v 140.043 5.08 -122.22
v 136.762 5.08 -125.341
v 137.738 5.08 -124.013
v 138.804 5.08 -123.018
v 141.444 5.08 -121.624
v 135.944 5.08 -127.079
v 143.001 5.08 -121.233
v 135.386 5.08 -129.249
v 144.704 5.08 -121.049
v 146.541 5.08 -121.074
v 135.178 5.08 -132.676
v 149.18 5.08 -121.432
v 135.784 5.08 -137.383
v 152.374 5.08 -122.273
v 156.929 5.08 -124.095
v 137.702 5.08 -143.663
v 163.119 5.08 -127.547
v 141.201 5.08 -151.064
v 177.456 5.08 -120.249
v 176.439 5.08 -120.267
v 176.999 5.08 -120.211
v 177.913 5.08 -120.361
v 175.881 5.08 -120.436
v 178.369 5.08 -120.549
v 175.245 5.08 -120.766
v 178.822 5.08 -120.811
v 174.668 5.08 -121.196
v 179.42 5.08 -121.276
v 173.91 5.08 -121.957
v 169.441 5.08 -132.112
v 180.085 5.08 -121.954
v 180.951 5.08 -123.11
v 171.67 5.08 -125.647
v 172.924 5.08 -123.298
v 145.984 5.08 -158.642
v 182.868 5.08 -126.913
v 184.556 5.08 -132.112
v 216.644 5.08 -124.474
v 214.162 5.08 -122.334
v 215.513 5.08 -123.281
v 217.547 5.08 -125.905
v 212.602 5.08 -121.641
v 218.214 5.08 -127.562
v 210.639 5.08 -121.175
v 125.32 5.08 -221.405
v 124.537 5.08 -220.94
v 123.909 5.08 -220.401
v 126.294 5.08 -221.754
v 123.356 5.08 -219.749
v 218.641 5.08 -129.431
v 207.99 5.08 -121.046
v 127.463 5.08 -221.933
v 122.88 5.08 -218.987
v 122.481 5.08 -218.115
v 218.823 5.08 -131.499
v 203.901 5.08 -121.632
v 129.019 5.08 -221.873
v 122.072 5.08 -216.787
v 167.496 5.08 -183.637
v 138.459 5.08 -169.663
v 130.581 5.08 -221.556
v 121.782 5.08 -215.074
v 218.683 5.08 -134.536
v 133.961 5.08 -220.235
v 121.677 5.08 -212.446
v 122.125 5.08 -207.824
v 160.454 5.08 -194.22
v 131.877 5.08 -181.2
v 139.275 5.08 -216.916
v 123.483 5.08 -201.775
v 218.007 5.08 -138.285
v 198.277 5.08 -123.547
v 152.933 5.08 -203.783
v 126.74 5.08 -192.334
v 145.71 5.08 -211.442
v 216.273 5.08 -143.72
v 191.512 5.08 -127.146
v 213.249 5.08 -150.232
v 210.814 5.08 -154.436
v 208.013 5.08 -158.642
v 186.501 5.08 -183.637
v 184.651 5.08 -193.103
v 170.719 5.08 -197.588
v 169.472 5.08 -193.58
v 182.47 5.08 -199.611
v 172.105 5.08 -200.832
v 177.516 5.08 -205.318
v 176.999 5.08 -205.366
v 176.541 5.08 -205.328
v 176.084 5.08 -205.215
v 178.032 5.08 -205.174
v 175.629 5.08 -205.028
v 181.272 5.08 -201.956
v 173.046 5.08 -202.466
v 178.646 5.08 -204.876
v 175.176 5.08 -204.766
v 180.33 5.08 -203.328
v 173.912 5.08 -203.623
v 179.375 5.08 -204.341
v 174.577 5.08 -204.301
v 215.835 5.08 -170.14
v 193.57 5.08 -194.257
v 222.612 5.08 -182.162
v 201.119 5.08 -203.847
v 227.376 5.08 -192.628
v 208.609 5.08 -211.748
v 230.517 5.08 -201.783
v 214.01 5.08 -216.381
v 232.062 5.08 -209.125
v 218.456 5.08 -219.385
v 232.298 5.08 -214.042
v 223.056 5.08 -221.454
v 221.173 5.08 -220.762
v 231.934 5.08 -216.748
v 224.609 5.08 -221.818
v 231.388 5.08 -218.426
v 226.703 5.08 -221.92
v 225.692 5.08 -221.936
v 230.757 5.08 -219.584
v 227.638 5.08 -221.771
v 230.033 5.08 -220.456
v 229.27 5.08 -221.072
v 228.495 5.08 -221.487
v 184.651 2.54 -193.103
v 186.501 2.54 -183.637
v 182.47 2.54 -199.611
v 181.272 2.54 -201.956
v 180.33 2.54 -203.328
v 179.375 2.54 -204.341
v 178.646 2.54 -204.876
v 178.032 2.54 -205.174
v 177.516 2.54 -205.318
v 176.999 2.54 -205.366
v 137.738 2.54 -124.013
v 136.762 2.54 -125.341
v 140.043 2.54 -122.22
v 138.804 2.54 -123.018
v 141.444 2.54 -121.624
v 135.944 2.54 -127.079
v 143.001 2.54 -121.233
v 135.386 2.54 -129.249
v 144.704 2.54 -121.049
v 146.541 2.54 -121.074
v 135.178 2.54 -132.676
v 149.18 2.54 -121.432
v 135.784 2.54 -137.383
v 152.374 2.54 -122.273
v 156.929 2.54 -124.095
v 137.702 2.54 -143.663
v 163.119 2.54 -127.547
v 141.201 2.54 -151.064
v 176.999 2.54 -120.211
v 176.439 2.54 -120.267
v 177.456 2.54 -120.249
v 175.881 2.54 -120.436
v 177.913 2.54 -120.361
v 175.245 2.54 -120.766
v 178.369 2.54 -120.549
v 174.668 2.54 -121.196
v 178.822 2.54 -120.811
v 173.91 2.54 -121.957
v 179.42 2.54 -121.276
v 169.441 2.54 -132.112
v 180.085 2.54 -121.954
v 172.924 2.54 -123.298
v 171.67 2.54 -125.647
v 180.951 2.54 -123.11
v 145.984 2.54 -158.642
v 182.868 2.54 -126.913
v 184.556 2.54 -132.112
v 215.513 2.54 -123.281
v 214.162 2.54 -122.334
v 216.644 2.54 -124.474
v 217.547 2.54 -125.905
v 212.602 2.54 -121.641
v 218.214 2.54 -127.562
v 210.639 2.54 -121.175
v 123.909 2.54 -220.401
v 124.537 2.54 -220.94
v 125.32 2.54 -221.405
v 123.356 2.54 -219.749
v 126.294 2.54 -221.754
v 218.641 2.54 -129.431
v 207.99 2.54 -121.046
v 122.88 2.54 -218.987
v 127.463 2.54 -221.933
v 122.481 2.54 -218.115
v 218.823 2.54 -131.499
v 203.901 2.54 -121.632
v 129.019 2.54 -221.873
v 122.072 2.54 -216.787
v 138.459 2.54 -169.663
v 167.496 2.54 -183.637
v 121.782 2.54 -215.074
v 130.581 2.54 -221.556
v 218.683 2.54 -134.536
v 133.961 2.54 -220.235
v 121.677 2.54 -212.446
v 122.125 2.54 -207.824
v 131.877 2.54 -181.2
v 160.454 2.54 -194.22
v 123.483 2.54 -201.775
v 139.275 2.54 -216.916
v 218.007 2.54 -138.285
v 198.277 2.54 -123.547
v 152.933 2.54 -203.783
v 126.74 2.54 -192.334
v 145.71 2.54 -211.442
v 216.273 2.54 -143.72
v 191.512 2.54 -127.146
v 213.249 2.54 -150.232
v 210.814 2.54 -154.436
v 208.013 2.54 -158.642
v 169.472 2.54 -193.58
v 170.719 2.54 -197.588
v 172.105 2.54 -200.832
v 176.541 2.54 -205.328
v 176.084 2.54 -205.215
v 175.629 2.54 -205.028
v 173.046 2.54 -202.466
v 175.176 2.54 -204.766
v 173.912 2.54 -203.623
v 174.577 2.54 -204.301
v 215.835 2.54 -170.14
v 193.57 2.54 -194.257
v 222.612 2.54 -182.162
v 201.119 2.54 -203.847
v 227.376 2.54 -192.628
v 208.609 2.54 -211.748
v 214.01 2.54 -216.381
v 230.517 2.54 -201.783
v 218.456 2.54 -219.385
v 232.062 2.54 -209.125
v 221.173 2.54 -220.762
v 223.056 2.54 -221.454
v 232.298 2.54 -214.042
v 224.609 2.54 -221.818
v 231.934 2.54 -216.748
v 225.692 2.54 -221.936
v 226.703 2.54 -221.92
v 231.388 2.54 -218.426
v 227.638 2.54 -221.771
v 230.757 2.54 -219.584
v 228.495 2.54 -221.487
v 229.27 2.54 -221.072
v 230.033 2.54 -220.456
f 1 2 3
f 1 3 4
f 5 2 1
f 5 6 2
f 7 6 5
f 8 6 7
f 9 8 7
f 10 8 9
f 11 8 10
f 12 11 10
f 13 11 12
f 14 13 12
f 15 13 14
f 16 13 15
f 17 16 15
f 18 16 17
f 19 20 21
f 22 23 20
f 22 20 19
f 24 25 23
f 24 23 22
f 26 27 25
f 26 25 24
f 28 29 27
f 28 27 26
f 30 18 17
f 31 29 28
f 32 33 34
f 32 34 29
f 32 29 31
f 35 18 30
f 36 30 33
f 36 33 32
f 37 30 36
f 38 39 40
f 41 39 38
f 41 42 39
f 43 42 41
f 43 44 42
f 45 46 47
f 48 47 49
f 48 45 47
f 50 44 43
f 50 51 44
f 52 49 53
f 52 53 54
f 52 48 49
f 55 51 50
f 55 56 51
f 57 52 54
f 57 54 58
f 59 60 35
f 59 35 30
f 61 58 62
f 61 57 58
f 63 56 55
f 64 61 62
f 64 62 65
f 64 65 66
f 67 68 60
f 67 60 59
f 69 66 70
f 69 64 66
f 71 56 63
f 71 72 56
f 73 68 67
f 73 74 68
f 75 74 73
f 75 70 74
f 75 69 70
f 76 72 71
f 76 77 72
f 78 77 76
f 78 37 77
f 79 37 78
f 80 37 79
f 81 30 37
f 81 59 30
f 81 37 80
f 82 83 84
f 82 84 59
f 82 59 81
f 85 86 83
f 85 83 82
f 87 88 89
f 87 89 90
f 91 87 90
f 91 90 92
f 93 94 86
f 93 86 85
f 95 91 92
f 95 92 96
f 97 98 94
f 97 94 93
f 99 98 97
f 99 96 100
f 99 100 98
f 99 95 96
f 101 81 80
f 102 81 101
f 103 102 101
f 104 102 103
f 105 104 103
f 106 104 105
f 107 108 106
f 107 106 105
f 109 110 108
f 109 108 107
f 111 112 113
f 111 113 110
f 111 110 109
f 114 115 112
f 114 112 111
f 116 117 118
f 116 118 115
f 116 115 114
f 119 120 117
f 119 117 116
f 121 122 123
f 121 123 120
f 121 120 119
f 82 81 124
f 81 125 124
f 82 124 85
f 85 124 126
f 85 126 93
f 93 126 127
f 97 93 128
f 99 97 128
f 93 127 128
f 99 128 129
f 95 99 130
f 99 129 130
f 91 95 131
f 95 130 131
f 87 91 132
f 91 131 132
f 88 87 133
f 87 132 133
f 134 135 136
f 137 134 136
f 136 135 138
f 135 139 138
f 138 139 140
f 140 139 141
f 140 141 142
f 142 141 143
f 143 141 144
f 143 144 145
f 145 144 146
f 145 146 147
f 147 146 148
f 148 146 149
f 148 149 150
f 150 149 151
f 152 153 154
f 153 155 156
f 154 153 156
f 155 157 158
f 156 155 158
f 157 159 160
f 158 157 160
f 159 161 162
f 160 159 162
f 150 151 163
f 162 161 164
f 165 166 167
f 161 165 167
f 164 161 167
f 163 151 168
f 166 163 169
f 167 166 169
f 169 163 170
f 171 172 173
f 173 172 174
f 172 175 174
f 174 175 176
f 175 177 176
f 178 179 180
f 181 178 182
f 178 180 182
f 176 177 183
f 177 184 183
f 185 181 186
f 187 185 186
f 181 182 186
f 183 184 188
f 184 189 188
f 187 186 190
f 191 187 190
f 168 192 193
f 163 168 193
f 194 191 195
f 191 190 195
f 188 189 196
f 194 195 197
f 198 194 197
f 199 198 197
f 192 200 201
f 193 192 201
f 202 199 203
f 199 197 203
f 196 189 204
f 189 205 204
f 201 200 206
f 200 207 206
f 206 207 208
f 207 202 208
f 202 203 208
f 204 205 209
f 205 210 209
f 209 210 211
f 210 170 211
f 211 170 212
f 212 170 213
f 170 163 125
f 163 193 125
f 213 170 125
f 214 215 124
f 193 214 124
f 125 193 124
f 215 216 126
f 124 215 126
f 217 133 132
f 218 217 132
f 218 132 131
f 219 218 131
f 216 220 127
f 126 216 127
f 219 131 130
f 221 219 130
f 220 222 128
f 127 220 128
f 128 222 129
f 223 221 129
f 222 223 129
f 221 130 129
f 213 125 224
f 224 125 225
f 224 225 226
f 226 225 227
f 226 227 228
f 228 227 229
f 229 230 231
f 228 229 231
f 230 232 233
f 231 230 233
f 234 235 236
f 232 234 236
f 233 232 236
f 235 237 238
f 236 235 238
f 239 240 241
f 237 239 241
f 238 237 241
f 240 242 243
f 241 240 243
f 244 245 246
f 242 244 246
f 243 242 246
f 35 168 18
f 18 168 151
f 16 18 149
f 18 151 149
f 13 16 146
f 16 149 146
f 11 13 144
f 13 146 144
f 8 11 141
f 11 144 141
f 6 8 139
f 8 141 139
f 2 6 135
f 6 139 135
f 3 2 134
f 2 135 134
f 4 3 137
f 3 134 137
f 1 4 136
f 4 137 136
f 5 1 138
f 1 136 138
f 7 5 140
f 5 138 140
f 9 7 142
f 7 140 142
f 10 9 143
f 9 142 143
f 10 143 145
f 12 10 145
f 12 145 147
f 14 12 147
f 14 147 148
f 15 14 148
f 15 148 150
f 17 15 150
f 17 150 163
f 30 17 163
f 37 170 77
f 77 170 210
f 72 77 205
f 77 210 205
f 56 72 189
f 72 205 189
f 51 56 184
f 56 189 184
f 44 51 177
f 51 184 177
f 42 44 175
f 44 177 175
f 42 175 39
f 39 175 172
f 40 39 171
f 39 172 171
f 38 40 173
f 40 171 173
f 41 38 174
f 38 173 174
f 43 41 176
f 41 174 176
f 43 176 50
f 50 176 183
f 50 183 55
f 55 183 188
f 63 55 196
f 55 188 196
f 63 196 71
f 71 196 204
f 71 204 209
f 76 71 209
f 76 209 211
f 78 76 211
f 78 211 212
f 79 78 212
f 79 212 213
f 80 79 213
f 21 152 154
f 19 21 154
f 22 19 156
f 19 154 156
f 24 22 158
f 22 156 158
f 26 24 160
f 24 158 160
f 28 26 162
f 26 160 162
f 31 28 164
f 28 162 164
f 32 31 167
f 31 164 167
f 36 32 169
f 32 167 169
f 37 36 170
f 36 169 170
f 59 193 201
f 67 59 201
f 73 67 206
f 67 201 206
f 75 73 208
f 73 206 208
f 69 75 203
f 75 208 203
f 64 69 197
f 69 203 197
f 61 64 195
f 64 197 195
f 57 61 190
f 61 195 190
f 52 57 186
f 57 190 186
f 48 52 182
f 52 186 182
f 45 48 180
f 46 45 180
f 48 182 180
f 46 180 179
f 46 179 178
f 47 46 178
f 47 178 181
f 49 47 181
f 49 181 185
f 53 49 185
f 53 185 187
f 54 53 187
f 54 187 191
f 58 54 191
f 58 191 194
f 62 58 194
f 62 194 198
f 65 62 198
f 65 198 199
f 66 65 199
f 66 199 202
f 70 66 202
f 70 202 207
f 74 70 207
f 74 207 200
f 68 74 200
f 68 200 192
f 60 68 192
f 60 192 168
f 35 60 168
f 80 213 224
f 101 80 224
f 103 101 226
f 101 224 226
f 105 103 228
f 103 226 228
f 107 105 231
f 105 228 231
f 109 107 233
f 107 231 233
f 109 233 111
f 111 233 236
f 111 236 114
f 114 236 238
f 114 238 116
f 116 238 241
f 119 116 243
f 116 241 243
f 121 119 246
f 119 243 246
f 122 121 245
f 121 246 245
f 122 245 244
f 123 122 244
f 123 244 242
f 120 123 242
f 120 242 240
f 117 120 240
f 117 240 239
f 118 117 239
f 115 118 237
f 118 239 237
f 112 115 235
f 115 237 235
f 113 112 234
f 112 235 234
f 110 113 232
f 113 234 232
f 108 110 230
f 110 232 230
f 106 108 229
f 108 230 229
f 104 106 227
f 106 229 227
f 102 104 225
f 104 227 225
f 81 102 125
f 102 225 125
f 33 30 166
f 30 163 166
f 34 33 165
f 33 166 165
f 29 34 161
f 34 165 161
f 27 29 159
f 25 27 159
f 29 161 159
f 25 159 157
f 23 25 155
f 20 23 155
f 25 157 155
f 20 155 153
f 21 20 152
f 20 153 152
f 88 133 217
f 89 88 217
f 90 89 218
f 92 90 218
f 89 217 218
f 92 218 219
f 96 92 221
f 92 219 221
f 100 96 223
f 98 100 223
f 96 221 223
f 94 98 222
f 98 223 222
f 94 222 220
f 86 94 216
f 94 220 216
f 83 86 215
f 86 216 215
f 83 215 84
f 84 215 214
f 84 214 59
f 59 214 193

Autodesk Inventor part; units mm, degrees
ref_plane "YZ Plane" through (0, 0, 0) normal (1, 0, 0) x (0, 1, 0)
ref_plane "XZ Plane" through (0, 0, 0) normal (0, 1, 0) x (-1, 0, 0)
ref_plane "Work Plane3" through (0, 2.54, 0) normal (0, 1, 0) x (1, 0, 0)
sketch "Sketch5" plane through (0, 2.54, 0) normal (0, 1, 0) x (1, 0, 0)
  ellipse E0 centre (201.451, 177.3473) end of major axis (229.2052, 221.1135) minor radius 16.0156 (208.013, 158.6416) -> (186.5008, 183.6371) ccw
  ellipse E1 centre (187.6899, 154.5313) end of major axis (215.633, 123.3862) minor radius 18.4642 (184.5561, 132.1117) -> (208.013, 158.6416) ccw
  ellipse E2 centre (176.9986, 162.7883) end of major axis (176.9986, 205.3655) minor radius 10.8982 (186.5008, 183.6371) -> (176.9986, 205.3655) ccw
  ellipse E3 centre (176.9986, 162.7883) end of major axis (176.9986, 205.3655) minor radius 10.8982 (176.9986, 120.211) -> (184.5561, 132.1117) ccw
  ellipse E4 centre (152.5463, 177.3473) end of major axis (124.7921, 221.1135) minor radius 16.0156 (167.4964, 183.6371) -> (145.9843, 158.6416) ccw
  ellipse E5 centre (166.3073, 154.5313) end of major axis (138.3642, 123.3862) minor radius 18.4642 (145.9843, 158.6416) -> (169.4411, 132.1117) ccw
  ellipse E6 centre (176.9986, 162.7883) end of major axis (176.9986, 205.3655) minor radius 10.8982 (176.9986, 205.3655) -> (167.4964, 183.6371) ccw
  ellipse E7 centre (176.9986, 162.7883) end of major axis (176.9986, 205.3655) minor radius 10.8982 (169.4411, 132.1117) -> (176.9986, 120.211) ccw
  ellipse E8 centre (166.3073, 154.5313) end of major axis (138.3642, 123.3862) minor radius 18.4642 (145.9843, 158.6416) -> (169.4411, 132.1117) ccw
  ellipse E9 centre (187.6899, 154.5313) end of major axis (215.633, 123.3862) minor radius 18.4642 (184.5561, 132.1117) -> (208.013, 158.6416) ccw
  point P0 (0, 0)
extrude "Extrusion7" add sketch "Sketch5" along normal blind 2.54
properties part number "Butterfly"
